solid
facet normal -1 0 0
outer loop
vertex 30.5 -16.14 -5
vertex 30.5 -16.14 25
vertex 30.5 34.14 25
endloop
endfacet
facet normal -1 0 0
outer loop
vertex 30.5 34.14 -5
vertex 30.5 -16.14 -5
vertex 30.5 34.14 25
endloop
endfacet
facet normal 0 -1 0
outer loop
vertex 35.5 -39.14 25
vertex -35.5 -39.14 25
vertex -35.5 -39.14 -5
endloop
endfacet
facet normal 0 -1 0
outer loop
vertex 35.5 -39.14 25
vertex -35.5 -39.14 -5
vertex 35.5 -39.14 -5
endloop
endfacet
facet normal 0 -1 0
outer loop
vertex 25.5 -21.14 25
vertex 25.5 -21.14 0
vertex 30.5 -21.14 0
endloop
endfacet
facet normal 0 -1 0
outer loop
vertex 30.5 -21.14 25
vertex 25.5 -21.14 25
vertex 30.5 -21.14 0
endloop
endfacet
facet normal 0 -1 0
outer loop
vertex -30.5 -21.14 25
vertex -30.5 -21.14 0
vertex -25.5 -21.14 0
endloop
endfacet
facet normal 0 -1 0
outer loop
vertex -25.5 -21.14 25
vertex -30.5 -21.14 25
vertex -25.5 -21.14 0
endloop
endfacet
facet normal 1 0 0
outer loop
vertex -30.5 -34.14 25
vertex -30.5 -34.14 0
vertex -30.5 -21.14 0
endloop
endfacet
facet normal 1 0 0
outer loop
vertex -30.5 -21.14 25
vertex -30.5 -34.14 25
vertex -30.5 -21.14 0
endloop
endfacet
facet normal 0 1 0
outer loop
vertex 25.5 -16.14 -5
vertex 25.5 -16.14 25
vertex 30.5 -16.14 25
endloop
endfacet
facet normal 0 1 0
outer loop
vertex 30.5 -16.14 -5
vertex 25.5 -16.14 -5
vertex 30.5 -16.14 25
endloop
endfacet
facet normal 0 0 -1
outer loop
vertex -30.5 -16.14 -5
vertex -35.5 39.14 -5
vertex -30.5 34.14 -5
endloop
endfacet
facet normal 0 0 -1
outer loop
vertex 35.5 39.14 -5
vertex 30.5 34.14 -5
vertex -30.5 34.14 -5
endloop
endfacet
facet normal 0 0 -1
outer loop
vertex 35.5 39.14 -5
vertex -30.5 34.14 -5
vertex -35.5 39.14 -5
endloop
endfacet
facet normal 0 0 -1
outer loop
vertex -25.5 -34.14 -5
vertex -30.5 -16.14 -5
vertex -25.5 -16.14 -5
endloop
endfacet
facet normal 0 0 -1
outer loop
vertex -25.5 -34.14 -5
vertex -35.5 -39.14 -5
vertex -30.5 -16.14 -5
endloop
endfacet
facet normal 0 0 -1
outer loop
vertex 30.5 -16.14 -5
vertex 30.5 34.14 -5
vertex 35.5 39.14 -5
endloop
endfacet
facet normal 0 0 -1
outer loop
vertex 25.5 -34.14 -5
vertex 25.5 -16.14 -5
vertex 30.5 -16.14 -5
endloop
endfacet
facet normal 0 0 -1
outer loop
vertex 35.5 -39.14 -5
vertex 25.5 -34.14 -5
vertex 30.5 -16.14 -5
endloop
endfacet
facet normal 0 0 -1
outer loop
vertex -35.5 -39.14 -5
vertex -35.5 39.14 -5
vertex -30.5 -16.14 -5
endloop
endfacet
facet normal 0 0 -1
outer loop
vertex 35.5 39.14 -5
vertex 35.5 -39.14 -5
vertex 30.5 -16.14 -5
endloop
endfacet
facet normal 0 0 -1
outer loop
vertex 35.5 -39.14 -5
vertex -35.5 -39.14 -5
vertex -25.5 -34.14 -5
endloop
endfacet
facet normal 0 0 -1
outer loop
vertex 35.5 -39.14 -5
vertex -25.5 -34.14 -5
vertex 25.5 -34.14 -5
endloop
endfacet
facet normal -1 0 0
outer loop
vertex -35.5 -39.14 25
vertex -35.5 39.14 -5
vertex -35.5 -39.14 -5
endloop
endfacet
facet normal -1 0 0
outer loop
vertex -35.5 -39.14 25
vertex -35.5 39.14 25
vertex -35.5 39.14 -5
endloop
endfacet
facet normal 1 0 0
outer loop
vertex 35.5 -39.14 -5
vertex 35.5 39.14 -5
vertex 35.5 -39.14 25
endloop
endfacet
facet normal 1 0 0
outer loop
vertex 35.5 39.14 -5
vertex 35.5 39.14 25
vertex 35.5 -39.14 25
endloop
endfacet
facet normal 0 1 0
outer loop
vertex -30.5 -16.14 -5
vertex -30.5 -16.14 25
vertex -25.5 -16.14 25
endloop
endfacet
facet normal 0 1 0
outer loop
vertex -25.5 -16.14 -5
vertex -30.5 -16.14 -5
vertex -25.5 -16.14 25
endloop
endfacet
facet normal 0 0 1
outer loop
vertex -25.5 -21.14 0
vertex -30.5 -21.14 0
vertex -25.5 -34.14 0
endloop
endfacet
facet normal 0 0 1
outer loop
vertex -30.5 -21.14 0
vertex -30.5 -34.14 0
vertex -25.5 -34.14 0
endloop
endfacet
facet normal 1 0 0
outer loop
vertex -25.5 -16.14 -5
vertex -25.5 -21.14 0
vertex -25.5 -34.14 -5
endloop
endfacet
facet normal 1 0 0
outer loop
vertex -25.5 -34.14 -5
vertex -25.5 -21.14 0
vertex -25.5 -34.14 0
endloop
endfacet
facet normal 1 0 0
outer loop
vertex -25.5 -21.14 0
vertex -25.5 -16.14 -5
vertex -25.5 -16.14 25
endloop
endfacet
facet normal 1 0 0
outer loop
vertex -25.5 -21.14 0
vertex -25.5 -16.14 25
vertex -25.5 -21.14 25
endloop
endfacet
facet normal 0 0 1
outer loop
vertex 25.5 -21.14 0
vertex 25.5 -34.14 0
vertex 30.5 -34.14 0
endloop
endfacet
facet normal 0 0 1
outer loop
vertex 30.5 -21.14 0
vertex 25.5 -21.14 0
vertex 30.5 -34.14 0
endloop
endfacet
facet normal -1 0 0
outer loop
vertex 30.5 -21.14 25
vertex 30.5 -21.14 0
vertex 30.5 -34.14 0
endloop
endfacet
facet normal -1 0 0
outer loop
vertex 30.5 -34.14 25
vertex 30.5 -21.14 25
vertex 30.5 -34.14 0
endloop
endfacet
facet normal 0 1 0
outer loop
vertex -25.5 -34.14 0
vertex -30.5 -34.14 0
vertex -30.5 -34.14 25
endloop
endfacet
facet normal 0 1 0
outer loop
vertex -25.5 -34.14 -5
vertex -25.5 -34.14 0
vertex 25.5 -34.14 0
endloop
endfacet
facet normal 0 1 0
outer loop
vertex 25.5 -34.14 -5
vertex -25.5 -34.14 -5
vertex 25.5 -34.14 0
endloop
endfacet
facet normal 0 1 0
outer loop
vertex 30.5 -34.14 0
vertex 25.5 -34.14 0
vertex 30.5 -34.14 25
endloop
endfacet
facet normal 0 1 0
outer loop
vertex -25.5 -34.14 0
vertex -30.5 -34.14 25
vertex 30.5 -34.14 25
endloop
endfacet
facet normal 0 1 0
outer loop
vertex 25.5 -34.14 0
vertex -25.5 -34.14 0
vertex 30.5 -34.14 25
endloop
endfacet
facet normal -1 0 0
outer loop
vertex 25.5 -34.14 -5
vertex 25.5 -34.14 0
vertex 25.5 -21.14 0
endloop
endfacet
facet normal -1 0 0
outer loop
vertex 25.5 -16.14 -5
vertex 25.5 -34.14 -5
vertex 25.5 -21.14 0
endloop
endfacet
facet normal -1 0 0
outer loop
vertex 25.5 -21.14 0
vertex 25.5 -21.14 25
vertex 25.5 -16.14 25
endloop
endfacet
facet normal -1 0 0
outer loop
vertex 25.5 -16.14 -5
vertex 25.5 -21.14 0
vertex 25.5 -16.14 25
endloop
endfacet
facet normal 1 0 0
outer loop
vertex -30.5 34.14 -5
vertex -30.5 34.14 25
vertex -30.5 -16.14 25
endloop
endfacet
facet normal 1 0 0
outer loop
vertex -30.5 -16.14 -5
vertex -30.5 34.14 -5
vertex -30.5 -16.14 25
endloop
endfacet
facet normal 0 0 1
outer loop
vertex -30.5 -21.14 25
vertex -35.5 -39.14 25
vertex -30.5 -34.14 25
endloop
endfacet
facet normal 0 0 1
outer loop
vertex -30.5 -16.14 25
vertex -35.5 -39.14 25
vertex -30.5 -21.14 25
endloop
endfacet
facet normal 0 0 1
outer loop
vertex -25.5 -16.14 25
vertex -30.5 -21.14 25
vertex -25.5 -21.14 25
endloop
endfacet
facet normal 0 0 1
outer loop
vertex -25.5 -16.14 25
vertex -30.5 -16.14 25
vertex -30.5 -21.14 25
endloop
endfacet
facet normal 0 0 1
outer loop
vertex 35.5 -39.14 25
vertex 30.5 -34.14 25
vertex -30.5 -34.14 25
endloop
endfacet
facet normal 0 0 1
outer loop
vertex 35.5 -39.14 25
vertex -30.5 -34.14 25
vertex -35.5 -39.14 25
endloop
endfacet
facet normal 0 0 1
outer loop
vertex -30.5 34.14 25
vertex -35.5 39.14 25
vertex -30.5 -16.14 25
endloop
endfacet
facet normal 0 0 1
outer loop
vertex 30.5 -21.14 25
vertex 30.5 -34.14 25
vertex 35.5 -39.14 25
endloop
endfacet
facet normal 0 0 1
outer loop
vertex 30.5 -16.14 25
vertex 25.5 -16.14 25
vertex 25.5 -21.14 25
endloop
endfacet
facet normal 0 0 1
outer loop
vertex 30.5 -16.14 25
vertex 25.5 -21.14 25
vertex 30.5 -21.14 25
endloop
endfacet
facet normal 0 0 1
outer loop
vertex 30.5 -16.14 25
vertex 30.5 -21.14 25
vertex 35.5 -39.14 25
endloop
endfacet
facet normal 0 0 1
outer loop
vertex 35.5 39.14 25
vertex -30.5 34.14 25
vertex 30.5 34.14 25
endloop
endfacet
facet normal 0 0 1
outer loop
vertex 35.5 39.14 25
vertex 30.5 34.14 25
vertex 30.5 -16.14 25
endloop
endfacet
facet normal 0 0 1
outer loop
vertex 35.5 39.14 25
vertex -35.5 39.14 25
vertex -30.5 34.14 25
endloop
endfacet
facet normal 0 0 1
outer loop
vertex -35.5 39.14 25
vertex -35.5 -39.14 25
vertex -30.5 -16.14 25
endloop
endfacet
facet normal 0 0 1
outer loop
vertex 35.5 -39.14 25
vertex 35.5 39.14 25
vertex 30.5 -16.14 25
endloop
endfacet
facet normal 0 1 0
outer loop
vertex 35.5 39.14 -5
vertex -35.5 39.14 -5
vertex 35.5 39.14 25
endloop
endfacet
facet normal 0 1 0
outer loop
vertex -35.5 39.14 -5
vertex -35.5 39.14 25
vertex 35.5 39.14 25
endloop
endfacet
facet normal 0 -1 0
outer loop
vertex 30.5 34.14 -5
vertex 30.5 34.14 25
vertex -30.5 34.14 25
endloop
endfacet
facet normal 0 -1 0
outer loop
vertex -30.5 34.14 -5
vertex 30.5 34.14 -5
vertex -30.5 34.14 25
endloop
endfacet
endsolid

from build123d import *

# Parameters (mm, degrees)
F0_W     = 71
F0_H     = 78.27916
F1_DEPTH = 25
F2_W     = 71
F2_H     = 78.27916
F3_DEPTH = 5


with BuildPart() as f1:
    # F0 (on Top) → F1 (new body)
    with BuildSketch(Plane.XY):
        Rectangle(F0_W, F0_H)
        Polygon((-30.5, -34.13958), (-30.5, -21.13958), (-25.5, -21.13958), (-25.5, -16.13958), (-30.5, -16.13958), (-30.5, 34.13958), (30.5, 34.13958), (30.5, -16.13958), (25.5, -16.13958), (25.5, -21.13958), (30.5, -21.13958), (30.5, -34.13958), align=None, mode=Mode.SUBTRACT)
    extrude(amount=F1_DEPTH)

    # F2 (on face) → F3 (join)
    with BuildSketch(Plane(origin=(0, 0, 0), x_dir=(1, 0, 0), z_dir=(0, 0, -1))):
        Rectangle(F2_W, F2_H)
        Polygon((-25.5, 34.13958), (25.5, 34.13958), (25.5, 16.13958), (30.5, 16.13958), (30.5, -34.13958), (-30.5, -34.13958), (-30.5, 16.13958), (-25.5, 16.13958), align=None, mode=Mode.SUBTRACT)
    extrude(amount=F3_DEPTH)


solid = f1.part
